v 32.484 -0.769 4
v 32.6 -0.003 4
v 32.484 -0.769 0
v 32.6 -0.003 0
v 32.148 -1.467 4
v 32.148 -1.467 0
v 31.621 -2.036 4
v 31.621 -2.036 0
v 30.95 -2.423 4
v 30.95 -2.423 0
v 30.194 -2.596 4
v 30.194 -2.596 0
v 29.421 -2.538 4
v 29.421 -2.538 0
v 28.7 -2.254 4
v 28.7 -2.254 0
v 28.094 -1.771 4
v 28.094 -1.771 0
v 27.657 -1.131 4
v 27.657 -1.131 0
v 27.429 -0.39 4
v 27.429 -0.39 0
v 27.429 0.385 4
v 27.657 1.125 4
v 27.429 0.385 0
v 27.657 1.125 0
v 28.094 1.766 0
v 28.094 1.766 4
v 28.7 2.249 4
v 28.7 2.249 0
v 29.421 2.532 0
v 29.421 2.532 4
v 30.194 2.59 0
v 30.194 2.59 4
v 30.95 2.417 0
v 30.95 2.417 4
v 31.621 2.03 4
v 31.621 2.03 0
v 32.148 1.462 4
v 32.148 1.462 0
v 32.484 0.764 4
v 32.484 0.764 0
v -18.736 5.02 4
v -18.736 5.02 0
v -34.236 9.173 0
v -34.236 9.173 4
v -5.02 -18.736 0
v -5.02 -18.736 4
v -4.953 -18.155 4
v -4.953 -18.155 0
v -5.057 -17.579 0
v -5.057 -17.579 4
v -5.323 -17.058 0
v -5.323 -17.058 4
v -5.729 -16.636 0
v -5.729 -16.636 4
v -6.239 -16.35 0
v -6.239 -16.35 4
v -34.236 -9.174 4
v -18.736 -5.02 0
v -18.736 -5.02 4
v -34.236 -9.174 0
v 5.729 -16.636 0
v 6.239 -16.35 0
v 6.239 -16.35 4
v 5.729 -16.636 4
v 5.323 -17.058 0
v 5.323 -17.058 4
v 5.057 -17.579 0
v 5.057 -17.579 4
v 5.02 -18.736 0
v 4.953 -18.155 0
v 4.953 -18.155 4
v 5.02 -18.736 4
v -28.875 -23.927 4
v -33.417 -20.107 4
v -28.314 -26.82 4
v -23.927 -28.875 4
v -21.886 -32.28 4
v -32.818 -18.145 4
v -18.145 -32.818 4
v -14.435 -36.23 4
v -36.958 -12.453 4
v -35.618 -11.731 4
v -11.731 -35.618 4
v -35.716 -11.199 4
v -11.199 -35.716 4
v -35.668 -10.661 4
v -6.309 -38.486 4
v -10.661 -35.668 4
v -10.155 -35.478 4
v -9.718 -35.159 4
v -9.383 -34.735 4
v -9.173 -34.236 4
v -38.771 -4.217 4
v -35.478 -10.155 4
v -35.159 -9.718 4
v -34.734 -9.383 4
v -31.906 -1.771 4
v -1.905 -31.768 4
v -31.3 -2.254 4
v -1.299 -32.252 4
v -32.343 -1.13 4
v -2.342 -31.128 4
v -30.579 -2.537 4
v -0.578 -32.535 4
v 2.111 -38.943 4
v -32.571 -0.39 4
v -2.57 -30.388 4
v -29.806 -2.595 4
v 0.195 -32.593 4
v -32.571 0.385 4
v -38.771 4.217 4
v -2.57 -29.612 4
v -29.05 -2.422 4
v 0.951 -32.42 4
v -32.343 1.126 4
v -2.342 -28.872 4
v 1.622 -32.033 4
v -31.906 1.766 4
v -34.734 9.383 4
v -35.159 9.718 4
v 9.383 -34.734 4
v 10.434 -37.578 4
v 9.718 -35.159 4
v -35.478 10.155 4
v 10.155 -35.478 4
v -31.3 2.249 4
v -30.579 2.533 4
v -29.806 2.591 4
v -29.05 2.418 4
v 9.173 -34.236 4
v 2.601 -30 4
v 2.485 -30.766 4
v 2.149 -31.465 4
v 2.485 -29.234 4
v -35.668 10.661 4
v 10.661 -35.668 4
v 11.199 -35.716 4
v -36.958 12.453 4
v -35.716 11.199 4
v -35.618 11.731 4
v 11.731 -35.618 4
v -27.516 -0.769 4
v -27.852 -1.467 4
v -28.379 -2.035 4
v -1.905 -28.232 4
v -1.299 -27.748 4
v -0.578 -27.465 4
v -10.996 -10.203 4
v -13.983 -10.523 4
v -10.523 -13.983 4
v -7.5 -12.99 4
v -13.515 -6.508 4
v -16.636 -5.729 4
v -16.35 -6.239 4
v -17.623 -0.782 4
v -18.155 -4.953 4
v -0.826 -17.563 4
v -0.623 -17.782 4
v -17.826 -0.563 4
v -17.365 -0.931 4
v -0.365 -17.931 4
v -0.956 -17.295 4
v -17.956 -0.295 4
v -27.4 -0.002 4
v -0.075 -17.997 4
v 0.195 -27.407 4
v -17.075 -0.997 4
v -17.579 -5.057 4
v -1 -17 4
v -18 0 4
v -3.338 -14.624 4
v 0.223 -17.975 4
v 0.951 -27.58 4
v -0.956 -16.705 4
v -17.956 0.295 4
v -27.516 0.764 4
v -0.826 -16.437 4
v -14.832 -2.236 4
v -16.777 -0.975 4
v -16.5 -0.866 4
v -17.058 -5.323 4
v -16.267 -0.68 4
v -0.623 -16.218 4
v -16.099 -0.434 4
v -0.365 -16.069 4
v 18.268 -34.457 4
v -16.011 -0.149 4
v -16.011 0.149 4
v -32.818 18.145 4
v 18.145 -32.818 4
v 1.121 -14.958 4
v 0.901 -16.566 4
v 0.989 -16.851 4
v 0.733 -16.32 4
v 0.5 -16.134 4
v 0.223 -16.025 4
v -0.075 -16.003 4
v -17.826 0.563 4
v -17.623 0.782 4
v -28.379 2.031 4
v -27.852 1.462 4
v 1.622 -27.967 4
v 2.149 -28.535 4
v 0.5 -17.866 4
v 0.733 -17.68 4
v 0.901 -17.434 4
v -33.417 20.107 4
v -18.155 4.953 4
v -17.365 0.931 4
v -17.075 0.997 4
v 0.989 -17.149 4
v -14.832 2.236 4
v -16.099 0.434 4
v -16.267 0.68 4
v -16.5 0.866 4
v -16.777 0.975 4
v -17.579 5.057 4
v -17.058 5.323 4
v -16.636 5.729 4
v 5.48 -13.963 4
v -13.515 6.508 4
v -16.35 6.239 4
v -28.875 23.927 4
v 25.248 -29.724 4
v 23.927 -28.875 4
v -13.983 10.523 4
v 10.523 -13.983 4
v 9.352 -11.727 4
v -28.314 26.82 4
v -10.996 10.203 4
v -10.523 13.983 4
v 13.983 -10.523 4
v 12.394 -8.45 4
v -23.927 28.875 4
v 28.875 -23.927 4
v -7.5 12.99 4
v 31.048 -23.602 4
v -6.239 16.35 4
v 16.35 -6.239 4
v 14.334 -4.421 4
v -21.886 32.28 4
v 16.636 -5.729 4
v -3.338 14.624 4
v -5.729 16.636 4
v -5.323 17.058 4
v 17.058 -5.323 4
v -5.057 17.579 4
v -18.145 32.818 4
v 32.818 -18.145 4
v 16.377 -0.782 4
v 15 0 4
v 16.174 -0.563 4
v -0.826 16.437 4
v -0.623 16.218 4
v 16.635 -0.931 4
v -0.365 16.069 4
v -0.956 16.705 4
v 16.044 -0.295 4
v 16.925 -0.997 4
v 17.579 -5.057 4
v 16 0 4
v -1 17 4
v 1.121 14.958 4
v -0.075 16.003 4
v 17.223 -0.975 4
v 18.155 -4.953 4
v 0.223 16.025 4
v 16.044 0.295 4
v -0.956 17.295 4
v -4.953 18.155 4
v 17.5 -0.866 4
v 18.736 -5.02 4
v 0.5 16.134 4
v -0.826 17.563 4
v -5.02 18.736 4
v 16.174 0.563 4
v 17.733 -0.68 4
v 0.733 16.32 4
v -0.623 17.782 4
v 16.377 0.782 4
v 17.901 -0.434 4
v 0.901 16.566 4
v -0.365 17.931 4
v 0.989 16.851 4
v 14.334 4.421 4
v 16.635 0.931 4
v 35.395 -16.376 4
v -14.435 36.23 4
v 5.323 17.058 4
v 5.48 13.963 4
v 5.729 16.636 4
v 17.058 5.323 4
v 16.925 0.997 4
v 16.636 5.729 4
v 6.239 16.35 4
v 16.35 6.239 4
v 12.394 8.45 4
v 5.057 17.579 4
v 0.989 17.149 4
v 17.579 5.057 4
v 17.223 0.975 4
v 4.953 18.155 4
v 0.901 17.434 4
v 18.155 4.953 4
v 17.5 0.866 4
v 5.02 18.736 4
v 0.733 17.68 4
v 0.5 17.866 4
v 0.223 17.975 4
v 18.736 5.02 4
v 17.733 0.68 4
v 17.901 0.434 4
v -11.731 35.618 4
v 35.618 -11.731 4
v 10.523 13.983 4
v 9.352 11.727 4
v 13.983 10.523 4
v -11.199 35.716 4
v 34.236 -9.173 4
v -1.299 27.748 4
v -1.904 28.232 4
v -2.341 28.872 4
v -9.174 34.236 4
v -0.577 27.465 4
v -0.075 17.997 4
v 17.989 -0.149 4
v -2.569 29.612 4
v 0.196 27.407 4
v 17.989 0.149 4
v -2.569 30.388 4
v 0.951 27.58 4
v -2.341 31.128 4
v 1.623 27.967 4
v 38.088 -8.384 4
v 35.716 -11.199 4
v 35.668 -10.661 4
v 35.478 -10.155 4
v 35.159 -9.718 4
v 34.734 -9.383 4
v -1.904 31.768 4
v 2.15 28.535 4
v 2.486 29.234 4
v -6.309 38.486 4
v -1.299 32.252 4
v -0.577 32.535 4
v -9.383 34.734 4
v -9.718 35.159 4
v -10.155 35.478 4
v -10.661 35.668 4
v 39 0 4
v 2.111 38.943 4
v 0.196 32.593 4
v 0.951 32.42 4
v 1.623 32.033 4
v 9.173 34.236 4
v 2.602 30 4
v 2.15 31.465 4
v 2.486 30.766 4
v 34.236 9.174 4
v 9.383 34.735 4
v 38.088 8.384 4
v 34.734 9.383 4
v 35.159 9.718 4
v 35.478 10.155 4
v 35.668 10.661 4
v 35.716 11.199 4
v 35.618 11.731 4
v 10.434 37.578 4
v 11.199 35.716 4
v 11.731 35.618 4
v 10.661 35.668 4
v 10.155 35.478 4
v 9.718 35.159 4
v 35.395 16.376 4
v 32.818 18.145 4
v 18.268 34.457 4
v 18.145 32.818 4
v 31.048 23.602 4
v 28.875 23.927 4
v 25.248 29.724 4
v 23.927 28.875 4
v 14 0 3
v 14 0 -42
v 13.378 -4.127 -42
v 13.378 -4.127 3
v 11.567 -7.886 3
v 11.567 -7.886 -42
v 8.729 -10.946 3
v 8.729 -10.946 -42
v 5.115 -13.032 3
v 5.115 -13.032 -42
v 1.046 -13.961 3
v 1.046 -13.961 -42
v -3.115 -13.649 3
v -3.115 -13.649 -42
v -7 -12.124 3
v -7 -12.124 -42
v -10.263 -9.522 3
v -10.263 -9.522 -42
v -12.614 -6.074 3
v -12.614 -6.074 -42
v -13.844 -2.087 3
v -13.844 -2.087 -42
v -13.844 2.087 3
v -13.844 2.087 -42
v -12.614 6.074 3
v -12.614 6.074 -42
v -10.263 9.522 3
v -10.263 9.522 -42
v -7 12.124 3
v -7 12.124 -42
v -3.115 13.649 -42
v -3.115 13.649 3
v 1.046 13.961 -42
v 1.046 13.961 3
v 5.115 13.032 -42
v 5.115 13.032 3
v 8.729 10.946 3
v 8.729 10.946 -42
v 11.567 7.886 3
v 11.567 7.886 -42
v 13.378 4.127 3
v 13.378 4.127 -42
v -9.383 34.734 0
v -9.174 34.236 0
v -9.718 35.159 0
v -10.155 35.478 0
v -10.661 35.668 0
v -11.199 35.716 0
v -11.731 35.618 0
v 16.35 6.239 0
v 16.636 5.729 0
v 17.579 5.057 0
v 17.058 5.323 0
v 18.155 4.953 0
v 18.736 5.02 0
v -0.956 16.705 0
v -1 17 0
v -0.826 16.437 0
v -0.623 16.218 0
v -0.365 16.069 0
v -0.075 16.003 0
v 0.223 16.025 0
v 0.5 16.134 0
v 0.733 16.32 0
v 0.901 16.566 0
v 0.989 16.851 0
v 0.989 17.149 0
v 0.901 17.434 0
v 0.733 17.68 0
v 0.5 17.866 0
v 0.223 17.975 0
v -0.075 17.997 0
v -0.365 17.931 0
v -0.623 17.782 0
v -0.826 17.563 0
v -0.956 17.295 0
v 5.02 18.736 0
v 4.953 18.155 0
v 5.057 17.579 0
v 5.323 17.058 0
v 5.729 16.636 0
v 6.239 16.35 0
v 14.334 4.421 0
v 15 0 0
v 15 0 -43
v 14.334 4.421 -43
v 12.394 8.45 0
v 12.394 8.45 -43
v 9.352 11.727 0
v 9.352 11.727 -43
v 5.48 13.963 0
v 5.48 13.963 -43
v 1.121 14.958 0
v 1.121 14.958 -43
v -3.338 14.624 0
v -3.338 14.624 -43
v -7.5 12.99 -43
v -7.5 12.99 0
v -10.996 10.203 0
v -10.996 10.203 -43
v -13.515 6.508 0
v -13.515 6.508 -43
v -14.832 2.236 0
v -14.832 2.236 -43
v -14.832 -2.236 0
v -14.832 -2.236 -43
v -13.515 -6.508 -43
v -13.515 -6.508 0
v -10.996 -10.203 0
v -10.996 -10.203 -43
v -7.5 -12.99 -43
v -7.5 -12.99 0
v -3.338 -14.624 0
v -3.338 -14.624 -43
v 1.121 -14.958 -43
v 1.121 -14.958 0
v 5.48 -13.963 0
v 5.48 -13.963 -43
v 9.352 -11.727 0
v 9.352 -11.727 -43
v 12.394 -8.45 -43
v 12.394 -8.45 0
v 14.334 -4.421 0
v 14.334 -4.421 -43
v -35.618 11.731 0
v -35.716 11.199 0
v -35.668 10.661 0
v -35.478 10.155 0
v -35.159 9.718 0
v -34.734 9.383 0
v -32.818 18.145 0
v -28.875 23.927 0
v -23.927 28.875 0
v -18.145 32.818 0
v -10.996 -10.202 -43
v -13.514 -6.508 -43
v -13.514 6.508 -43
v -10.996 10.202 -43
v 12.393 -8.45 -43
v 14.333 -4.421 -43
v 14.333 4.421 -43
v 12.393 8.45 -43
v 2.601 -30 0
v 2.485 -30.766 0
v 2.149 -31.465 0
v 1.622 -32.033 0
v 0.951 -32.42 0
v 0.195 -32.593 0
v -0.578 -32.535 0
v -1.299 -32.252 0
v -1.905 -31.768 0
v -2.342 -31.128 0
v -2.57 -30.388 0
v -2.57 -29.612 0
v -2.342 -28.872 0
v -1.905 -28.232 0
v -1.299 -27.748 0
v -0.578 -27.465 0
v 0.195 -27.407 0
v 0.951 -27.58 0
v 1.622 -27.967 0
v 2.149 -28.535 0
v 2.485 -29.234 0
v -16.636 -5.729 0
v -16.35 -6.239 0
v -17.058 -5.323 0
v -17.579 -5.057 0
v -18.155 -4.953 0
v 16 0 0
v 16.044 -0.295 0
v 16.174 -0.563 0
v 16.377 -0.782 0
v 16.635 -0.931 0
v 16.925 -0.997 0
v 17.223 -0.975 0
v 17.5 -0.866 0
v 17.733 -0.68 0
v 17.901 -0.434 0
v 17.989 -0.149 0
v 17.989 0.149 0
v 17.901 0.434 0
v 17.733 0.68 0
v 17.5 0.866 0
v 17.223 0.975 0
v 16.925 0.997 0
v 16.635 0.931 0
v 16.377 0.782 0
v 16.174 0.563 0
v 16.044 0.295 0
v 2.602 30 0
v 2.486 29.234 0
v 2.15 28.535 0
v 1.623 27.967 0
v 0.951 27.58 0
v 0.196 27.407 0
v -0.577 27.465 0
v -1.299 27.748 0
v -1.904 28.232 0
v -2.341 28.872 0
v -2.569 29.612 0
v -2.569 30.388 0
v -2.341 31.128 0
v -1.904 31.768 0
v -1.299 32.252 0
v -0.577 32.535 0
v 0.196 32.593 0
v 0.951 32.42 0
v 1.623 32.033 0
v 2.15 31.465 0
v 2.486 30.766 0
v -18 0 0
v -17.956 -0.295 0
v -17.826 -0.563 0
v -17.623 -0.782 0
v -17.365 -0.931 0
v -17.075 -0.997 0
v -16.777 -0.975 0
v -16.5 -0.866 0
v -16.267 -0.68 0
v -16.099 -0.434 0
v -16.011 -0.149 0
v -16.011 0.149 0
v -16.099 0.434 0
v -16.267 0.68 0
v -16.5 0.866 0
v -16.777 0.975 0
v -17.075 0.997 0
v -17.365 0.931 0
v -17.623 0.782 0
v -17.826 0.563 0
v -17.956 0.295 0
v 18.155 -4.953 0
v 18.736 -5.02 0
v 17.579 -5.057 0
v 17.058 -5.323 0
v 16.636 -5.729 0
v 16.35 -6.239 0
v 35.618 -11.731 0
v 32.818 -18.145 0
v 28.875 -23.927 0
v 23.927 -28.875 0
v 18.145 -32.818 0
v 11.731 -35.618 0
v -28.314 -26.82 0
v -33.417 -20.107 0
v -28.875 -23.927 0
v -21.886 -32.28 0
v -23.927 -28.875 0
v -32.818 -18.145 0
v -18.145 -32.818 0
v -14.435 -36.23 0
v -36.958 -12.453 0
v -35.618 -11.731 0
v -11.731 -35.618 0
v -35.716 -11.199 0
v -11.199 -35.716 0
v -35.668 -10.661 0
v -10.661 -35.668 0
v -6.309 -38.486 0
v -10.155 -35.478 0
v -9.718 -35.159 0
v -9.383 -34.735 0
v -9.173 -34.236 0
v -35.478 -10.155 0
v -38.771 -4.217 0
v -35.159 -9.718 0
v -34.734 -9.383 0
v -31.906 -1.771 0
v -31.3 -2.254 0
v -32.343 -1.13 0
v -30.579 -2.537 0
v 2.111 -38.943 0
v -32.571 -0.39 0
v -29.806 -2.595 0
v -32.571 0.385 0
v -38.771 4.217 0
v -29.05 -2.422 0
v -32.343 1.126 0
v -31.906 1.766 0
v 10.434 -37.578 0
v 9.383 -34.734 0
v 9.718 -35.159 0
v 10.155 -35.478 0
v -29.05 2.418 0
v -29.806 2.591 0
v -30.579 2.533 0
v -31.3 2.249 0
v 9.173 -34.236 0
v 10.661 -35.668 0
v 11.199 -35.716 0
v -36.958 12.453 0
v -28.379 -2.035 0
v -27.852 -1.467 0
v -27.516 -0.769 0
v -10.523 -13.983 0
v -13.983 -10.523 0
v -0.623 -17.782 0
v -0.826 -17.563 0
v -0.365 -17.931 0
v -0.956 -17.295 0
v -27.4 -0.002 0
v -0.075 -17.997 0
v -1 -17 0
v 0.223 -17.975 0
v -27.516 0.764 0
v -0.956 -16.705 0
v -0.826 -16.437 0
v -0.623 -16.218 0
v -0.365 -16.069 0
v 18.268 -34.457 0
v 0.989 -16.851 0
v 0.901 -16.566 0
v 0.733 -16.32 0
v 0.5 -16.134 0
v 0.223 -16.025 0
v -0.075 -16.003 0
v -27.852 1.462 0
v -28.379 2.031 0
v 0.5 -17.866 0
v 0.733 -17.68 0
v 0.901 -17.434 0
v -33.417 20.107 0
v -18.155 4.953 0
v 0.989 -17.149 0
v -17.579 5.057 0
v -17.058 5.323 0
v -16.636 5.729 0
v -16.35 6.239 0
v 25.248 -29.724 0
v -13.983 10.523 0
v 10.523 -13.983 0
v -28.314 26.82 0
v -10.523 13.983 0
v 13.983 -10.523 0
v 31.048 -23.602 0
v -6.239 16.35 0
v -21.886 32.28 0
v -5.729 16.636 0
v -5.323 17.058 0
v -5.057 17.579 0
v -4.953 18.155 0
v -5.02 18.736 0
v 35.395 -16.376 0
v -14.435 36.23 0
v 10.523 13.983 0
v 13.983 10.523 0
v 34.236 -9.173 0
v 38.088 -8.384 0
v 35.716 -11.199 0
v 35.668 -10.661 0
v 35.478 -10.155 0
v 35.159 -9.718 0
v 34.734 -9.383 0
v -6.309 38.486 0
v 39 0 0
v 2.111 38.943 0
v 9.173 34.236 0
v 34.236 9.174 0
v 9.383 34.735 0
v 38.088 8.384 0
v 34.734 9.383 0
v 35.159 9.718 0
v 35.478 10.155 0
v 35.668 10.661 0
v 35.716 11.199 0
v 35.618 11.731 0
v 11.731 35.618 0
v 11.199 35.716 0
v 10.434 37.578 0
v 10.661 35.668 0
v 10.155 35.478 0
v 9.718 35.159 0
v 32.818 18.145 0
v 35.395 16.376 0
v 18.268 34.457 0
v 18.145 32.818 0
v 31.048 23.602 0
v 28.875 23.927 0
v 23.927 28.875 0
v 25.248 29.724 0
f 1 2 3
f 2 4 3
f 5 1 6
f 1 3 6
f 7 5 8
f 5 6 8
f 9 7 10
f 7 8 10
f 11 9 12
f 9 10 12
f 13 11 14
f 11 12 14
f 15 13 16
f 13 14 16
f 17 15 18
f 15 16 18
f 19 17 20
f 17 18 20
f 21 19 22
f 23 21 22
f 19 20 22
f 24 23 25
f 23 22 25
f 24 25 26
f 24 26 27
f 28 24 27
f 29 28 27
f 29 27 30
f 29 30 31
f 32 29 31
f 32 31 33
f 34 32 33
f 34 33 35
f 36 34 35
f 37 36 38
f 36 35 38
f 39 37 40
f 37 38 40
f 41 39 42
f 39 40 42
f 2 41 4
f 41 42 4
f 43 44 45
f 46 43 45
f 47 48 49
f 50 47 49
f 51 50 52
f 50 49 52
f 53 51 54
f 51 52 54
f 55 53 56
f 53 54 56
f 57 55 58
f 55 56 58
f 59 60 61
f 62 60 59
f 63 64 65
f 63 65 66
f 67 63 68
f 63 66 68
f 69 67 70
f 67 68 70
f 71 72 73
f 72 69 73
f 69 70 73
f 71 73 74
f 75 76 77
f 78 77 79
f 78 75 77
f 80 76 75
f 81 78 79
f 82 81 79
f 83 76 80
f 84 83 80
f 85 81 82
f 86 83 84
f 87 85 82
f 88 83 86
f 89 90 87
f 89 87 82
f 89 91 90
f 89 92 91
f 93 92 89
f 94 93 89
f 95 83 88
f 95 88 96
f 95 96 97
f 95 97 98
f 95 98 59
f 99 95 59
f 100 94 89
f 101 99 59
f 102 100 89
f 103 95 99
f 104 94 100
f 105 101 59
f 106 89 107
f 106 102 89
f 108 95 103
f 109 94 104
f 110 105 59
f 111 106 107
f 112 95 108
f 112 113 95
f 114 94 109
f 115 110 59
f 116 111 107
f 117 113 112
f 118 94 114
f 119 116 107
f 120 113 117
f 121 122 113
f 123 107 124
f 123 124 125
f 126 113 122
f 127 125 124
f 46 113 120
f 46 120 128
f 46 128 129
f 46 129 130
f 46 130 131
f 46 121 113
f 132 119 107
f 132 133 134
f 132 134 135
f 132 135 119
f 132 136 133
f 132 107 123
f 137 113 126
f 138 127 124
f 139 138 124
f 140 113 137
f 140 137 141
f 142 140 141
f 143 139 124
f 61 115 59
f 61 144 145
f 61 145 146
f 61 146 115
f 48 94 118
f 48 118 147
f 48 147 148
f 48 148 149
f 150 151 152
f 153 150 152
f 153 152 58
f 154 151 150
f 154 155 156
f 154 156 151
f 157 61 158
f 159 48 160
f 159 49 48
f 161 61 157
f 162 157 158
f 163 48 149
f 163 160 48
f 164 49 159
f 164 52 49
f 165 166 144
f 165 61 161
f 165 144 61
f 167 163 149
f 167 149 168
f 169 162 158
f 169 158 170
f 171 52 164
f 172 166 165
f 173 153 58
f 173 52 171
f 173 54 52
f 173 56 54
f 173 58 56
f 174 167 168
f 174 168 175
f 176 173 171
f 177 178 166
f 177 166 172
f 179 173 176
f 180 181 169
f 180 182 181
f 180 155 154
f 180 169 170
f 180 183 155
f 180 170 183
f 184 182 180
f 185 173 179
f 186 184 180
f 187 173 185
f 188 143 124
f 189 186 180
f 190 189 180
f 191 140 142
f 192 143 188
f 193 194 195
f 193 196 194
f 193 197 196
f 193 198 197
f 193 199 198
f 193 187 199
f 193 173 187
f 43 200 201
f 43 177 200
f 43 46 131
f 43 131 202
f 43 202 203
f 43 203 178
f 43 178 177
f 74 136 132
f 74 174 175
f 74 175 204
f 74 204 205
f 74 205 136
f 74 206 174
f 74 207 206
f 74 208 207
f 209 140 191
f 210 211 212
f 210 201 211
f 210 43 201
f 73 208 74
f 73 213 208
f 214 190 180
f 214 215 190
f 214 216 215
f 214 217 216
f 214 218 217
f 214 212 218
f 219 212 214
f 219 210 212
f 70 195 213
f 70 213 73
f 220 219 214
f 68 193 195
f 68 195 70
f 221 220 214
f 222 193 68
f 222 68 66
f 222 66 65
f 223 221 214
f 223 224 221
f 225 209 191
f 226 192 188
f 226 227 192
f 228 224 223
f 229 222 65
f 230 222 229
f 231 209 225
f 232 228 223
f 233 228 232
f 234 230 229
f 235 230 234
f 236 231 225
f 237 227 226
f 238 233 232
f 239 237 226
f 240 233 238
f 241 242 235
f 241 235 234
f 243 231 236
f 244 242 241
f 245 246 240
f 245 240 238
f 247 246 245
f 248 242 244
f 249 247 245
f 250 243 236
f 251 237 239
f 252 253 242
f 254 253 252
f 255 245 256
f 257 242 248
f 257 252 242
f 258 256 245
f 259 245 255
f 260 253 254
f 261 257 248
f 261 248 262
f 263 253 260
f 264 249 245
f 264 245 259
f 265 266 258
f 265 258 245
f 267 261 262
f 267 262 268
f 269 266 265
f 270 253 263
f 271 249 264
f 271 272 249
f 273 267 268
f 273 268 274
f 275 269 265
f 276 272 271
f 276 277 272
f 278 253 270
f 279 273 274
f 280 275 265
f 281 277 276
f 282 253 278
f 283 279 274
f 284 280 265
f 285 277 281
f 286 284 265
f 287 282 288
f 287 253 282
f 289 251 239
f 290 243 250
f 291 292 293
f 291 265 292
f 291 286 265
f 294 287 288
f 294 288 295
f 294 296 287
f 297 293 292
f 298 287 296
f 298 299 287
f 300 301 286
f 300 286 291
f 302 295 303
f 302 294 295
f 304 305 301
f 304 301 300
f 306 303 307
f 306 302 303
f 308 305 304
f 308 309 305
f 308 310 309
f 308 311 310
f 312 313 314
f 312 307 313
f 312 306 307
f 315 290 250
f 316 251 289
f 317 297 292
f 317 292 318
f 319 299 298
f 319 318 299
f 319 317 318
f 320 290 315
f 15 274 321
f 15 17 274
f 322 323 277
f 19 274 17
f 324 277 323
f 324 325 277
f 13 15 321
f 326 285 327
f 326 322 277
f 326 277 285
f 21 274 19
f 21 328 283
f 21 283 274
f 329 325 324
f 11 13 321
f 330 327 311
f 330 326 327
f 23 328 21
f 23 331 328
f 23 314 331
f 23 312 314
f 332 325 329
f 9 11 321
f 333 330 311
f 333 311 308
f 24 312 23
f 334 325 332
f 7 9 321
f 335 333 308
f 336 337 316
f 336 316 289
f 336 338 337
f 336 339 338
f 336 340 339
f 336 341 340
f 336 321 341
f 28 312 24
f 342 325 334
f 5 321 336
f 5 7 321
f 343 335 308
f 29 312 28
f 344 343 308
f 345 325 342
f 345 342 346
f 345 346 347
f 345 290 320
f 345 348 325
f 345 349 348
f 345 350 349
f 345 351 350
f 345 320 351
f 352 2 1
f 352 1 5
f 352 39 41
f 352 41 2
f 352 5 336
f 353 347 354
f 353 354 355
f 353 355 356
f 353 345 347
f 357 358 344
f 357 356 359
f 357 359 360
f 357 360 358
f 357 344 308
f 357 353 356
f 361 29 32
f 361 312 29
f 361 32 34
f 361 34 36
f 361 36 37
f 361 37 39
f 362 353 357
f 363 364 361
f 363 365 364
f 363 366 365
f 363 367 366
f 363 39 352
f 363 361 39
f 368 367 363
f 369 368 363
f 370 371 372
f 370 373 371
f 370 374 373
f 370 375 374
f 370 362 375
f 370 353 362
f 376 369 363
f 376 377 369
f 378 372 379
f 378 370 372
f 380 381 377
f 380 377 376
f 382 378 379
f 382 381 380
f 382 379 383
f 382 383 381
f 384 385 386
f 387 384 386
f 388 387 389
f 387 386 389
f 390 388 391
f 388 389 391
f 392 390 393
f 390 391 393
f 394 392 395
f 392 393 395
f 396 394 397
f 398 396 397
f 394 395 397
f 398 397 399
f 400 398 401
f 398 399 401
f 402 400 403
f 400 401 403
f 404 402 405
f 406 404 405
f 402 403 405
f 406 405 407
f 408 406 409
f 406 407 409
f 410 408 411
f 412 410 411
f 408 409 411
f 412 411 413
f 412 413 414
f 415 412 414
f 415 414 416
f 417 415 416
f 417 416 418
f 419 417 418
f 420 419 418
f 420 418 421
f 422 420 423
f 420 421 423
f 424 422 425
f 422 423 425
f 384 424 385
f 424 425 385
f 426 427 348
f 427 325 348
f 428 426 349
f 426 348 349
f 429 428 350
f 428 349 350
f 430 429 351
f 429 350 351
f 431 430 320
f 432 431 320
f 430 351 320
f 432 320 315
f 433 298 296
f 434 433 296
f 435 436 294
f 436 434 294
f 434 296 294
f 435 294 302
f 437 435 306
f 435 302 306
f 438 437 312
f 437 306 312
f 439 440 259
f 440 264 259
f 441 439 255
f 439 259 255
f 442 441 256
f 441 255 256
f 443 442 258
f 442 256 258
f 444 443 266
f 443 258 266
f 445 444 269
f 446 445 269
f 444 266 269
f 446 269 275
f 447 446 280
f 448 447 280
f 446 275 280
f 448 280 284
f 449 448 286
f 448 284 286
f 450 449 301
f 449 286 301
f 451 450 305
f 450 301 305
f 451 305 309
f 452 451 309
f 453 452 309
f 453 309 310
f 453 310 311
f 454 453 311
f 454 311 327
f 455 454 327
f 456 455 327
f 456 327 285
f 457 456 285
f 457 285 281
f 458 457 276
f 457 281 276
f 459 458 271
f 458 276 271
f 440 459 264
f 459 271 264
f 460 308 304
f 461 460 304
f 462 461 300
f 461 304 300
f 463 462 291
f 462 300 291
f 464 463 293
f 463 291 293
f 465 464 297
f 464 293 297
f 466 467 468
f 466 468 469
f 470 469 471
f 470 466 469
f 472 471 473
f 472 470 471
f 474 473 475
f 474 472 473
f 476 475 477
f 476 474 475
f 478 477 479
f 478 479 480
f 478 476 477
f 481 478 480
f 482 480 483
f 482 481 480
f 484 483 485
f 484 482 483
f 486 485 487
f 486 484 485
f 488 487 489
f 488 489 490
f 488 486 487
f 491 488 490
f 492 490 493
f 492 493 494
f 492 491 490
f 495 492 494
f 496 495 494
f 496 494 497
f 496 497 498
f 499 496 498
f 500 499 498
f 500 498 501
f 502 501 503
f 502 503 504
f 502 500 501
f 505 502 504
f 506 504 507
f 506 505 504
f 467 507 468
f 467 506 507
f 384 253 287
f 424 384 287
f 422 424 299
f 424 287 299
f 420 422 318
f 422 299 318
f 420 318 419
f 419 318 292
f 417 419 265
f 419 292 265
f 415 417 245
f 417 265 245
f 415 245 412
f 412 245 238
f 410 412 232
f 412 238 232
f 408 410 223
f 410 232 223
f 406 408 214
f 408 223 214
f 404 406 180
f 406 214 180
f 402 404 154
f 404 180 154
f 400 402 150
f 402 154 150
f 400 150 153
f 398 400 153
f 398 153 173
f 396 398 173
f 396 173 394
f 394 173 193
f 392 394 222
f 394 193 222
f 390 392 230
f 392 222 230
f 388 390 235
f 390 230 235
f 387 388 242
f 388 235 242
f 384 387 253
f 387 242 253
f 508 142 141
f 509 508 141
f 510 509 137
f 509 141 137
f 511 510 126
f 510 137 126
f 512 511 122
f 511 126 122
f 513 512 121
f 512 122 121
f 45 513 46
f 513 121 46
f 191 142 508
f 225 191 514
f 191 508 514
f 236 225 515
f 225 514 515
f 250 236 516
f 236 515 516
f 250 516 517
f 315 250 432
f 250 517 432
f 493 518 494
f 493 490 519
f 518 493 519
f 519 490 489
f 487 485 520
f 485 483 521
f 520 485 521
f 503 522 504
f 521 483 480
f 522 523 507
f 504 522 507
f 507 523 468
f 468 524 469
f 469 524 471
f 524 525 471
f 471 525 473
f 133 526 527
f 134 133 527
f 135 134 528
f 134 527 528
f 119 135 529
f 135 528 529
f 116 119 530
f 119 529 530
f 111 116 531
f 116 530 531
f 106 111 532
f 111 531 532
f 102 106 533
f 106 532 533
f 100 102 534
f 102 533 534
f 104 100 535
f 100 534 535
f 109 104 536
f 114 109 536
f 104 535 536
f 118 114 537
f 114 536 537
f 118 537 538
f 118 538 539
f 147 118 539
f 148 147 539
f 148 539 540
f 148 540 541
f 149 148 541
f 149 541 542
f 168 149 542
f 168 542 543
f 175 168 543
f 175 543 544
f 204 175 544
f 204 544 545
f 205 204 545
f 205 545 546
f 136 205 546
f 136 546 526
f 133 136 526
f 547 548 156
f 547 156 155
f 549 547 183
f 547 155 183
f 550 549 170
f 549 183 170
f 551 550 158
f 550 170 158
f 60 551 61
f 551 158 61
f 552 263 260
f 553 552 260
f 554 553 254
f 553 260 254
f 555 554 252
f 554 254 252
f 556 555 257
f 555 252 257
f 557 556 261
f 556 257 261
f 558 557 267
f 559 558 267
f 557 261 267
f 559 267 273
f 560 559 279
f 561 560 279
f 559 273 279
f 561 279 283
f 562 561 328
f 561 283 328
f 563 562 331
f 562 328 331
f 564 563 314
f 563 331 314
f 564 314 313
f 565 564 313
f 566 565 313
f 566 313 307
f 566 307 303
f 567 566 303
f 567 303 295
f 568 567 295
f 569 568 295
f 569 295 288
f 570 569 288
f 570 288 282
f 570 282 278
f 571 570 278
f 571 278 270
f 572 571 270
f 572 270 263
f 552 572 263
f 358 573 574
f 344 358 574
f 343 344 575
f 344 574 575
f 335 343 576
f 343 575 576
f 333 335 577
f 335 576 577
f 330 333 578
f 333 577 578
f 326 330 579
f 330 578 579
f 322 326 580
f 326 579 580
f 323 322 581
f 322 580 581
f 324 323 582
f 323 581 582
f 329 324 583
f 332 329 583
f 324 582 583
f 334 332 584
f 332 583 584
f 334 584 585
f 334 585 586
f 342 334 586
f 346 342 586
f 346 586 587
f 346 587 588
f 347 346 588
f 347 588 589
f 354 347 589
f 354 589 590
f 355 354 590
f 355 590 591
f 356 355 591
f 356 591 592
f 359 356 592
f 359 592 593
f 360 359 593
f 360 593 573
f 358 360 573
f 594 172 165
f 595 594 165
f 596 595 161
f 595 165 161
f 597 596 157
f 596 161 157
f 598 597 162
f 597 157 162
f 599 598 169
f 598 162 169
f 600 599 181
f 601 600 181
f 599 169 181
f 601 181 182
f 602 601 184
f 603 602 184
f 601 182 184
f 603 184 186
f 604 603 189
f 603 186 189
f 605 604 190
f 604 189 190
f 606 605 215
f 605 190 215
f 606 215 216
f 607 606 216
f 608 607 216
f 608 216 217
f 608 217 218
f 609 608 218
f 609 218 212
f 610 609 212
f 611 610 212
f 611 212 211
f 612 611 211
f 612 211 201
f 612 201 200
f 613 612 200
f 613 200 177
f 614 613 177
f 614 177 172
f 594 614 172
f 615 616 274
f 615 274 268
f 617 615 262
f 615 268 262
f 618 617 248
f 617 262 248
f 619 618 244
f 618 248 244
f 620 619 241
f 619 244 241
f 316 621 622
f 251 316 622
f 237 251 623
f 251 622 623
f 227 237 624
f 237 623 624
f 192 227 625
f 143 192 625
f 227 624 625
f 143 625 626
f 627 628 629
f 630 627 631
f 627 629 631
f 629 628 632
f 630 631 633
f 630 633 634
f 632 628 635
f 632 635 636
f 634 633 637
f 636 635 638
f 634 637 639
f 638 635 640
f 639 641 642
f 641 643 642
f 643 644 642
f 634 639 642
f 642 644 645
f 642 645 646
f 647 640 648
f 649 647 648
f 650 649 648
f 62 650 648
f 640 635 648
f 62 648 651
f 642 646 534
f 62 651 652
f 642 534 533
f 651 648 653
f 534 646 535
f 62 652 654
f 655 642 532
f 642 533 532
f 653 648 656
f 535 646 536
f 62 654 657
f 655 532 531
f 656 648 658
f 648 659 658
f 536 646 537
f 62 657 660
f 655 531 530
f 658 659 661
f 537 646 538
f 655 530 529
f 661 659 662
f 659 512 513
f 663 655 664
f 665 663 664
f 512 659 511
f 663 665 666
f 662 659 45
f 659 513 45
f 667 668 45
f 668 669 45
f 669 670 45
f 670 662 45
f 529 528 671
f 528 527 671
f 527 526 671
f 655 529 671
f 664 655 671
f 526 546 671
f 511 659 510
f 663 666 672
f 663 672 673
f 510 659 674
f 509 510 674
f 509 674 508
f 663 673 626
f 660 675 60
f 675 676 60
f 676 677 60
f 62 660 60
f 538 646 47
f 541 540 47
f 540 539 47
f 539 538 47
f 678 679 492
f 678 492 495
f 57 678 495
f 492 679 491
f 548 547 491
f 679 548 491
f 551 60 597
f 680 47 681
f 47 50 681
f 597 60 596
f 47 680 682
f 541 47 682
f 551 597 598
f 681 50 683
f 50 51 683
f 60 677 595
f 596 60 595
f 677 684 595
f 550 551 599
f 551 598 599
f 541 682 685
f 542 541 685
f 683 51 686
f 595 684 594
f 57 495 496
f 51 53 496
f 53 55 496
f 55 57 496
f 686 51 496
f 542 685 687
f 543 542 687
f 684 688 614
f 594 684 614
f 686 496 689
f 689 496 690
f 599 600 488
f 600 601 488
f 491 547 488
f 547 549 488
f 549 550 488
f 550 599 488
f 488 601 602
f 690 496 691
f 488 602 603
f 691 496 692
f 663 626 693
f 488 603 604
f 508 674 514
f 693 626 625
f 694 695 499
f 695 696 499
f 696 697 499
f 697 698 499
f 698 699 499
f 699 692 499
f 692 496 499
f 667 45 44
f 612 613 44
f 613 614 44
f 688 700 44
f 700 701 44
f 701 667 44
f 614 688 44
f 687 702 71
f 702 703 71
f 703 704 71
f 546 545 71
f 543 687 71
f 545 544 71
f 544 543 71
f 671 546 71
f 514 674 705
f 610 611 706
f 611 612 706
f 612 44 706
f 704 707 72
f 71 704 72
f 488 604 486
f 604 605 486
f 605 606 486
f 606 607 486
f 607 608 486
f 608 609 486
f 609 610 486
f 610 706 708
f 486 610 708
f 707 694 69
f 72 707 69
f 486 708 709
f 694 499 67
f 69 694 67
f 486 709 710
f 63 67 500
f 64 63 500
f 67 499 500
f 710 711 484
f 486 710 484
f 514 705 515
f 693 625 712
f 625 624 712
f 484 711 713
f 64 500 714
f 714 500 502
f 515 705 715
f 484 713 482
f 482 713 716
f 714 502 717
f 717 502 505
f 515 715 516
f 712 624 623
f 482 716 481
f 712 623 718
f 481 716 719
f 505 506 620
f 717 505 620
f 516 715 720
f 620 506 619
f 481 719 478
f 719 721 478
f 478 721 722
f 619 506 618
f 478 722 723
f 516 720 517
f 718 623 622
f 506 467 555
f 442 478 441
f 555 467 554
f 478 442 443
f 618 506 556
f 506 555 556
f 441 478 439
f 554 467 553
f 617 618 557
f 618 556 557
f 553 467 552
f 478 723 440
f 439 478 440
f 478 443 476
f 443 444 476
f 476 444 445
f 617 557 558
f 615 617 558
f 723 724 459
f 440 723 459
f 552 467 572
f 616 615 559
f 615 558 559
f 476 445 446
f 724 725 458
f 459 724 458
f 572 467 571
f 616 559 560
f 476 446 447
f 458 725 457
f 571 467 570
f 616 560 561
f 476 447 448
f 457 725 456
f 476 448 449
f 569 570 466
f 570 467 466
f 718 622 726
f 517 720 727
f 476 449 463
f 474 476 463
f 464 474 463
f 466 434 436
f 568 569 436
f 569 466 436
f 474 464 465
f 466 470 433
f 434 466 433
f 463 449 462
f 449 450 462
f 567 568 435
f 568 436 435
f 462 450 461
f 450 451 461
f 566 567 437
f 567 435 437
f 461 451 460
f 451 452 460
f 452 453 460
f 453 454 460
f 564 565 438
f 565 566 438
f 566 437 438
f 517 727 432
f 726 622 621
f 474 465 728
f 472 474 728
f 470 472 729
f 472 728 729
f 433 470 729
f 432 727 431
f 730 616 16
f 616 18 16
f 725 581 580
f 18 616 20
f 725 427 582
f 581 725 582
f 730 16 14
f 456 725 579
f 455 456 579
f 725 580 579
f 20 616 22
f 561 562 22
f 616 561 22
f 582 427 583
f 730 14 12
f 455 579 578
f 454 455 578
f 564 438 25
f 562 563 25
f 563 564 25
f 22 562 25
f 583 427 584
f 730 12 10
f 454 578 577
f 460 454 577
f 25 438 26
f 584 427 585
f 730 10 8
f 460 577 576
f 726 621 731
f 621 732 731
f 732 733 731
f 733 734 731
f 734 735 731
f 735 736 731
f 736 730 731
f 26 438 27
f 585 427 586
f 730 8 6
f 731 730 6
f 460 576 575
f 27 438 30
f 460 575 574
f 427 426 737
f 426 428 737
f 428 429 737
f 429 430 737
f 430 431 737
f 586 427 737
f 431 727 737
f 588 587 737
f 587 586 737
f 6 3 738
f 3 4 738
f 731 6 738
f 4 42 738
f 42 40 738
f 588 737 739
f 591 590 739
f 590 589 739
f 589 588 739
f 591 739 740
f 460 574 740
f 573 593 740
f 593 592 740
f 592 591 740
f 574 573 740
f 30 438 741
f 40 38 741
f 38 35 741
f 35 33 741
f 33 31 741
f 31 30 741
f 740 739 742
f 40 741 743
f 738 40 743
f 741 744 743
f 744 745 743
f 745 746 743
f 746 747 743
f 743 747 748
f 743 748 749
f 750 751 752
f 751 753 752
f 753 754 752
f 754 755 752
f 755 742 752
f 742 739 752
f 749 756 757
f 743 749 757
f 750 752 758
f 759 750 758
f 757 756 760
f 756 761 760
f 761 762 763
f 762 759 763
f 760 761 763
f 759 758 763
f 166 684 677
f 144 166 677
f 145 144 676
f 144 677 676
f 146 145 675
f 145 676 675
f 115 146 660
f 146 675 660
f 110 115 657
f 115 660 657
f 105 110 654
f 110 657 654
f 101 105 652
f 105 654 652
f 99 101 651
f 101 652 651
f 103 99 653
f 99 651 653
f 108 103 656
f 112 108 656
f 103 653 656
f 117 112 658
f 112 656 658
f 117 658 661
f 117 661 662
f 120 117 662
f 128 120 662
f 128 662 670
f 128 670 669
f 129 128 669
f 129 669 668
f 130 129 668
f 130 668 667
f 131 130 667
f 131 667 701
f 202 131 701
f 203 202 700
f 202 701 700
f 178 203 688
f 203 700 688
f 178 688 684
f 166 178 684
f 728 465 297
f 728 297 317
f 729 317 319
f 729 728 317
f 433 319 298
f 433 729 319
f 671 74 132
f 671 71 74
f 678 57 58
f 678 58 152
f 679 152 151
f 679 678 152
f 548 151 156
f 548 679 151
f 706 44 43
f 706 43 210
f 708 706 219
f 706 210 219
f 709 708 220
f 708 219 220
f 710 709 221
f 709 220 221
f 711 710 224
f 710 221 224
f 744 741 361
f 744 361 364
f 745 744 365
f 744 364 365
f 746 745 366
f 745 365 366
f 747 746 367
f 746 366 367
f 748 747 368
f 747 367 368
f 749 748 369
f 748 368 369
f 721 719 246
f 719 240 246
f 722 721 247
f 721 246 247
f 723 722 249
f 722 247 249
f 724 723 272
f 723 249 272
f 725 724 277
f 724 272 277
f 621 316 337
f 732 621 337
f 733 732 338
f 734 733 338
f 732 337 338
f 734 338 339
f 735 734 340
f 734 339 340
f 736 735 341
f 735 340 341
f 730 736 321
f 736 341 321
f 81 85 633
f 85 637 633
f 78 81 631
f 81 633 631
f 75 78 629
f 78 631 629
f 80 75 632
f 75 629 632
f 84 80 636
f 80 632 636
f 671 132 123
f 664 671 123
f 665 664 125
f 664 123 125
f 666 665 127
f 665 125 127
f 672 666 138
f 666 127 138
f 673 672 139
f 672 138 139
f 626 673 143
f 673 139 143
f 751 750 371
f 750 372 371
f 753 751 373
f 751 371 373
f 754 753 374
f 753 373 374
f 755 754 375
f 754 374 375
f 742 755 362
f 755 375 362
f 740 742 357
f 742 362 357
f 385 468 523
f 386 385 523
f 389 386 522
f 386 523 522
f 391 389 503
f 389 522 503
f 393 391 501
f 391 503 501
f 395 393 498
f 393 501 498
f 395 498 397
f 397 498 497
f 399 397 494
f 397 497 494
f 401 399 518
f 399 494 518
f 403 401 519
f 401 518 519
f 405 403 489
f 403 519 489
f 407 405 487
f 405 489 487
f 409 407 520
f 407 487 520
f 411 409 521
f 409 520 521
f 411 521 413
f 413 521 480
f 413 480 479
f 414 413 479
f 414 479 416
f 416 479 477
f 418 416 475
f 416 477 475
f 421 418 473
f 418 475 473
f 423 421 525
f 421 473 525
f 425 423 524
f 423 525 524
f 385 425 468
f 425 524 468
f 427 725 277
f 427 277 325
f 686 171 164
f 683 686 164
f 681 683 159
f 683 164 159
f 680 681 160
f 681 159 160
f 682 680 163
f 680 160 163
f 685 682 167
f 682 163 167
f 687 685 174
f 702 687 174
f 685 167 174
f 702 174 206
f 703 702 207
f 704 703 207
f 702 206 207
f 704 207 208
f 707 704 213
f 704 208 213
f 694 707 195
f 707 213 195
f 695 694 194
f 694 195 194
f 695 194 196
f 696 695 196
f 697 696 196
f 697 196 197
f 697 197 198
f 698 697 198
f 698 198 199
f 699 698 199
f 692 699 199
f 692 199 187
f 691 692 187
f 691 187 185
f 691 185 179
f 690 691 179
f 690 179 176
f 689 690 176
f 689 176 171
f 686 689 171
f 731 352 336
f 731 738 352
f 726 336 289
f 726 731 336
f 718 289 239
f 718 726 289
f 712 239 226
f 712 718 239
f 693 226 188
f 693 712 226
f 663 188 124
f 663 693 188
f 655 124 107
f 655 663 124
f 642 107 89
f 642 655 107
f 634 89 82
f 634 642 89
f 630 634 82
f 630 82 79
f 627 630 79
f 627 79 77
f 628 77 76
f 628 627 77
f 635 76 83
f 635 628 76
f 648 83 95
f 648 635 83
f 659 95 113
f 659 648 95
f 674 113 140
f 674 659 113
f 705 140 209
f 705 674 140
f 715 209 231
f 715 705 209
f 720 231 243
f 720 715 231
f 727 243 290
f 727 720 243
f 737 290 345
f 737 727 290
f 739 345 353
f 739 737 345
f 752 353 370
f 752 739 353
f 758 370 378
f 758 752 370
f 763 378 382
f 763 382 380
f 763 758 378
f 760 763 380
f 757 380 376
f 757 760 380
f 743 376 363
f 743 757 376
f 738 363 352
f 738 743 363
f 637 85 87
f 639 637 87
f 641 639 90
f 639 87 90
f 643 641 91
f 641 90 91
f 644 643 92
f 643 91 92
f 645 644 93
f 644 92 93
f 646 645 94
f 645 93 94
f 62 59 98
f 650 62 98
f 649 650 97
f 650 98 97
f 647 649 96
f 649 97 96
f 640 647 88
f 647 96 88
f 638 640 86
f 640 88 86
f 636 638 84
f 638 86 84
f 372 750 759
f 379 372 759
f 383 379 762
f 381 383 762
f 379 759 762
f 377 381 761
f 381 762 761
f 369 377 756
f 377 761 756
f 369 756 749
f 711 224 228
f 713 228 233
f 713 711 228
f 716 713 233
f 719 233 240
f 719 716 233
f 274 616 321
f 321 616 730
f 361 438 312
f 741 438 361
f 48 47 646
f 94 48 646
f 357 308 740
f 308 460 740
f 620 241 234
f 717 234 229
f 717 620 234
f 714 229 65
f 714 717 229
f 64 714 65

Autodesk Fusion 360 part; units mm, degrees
sketch "Sketch1" plane through (0, 0, 0) normal (0, 0, 1) x (1, 0, 0)
  circle A0 centre (0, 0) radius 39
  circle A1 centre (0, 0) radius 14
  circle A2 centre (0, 0) radius 17 construction
  circle A3 centre (0, 0) radius 17.5
  circle A4 centre (0, 0) radius 37.5
  line L0 (0, 0) -> (-11.368, 42.4258)
  line L1 (0, 0) -> (43.9224, 0) construction
  line L2 (0, 0) -> (10.4937, -39.163)
  line L3 (0, 0) -> (40.5446, 0) construction
  line L4 (0, 0) -> (-10.0939, -37.6711)
  line L5 (0, 0) -> (39, 0) construction
  line L6 (0, 0) -> (15.1457, 56.5247)
  line L7 (0, 0) -> (58.5186, 0) construction
  line L8 (0, 0) -> (-54.6126, 14.6334)
  line L9 (0, 0) -> (56.5391, 0) construction
  line L10 (0, 0) -> (51.9352, -13.916)
  line L11 (0, 0) -> (53.7673, 0) construction
  line L12 (0, 0) -> (-45.8179, -12.2769)
  line L13 (0, 0) -> (47.4342, 0) construction
  line L14 (0, 0) -> (50.4228, 13.5108)
  line L15 (0, 0) -> (52.2015, 0) construction
  dimension "d1" = 78
  dimension "d2" = 28
  dimension "d3" = 34
  dimension "d32" = 35
  dimension "d33" = 75
  dimension "d34" = 105
  dimension "d35" = 75
  dimension "d36" = 105
  dimension "d37" = 75
  dimension "d38" = 165
  dimension "d39" = 15
  dimension "d40" = 165
  dimension "d41" = 15
extrude "Extrude1" add sketch "Sketch1" along normal blind 4 contours A0 A4 L10 L14 | A0 A4 L6 L14 | A0 A4 L2 L10 | A0 A4 L0 L6 | A3 A4 L6 L14 | A3 A4 L10 L14 | A0 A4 L2 L4 | A3 A4 L2 L10 | A0 A4 L0 L8 | A3 A4 L0 L6 | A1 A3 L6 L14 | A1 A3 L10 L14 | A0 A4 L4 L12 | A3 A4 L2 L4 | A1 A3 L2 L10 | A0 A4 L8 L12 | A3 A4 L0 L8 | A1 A3 L0 L6 | A3 A4 L4 L12 | A1 A3 L2 L4 | A3 A4 L8 L12 | A1 A3 L0 L8 | A1 A3 L4 L12 | A1 A3 L8 L12
sketch "Sketch2" plane through (0, 0, 4) normal (0, 0, 1) x (-1, 0, 0)
  circle A0 centre (0, 0) radius 14
  circle A1 centre (0, 0) radius 39
  line L0 (37, 0) -> (-50, 0) construction
  line L1 (0, -40) -> (0, 43.9283) construction
  circle A2 centre (17, 0) radius 1
  circle A3 centre (0, 17) radius 1
  circle A4 centre (-17, 0) radius 1
  circle A5 centre (0, -17) radius 1
  dimension "d6" = 83.9283
  dimension "d7" = 2
  dimension "d8" = 2
  dimension "d9" = 2
  dimension "d10" = 2
extrude "Extrude2" cut sketch "Sketch2" against normal blind 5 contours A2 | A3 | A4 | A5
sketch "Sketch3" plane through (0, 0, 0) normal (0, 0, 1) x (1, 0, 0)
  circle A0 centre (0, 0) radius 30 construction
  circle A1 centre (30, -0.0028) radius 2.6
  circle A2 centre (0.0015, 30) radius 2.6
  circle A3 centre (-30, -0.0022) radius 2.6
  circle A4 centre (0.0008, -30) radius 2.6
  dimension "d13" = 60
  dimension "d14" = 5.2
  dimension "d15" = 5.2
  dimension "d16" = 5.2
  dimension "d17" = 5.2
extrude "Extrude3" cut sketch "Sketch3" along normal blind 5
sketch "Sketch4" plane through (0, 0, 0) normal (0, 0, 1) x (1, 0, 0)
  circle A0 centre (0, 0) radius 15
  circle A1 centre (0, 0) radius 14
  dimension "d20" = 30
  dimension "d21" = 28
extrude "Extrude4" add sketch "Sketch4" against normal blind 43
extrude "Extrude6" cut sketch "Sketch1" along normal blind 5 contours A3 A4 L6 L14 | A3 A4 L2 L10 | A3 A4 L0 L8 | A3 A4 L4 L12
fillet "Fillet3" radius 2 15 edges at (-9.7057, -36.2222, 2) (9.7057, -36.2222, 2) (-36.2222, -9.7057, 2) (-16.9037, -4.5293, 2) (-4.5293, -16.9037, 2) (-16.9037, 4.5293, 2) (-36.2222, 9.7057, 2) (16.9037, -4.5293, 2) (36.2222, -9.7057, 2) (-9.7057, 36.2222, 2) (-4.5293, 16.9037, 2) (36.2222, 9.7057, 2) (16.9037, 4.5293, 2) (9.7057, 36.2222, 2) (4.5293, 16.9037, 2)
fillet "Fillet4" radius 2 1 edges at (4.5293, -16.9037, 2)
chamfer "Chamfer1" distance 1 angle 45 1 edges at (-13.0526, -5.0626, -43)
chamfer "Chamfer2" distance 1 angle 45 1 edges at (-13.0526, 5.0626, 4)
